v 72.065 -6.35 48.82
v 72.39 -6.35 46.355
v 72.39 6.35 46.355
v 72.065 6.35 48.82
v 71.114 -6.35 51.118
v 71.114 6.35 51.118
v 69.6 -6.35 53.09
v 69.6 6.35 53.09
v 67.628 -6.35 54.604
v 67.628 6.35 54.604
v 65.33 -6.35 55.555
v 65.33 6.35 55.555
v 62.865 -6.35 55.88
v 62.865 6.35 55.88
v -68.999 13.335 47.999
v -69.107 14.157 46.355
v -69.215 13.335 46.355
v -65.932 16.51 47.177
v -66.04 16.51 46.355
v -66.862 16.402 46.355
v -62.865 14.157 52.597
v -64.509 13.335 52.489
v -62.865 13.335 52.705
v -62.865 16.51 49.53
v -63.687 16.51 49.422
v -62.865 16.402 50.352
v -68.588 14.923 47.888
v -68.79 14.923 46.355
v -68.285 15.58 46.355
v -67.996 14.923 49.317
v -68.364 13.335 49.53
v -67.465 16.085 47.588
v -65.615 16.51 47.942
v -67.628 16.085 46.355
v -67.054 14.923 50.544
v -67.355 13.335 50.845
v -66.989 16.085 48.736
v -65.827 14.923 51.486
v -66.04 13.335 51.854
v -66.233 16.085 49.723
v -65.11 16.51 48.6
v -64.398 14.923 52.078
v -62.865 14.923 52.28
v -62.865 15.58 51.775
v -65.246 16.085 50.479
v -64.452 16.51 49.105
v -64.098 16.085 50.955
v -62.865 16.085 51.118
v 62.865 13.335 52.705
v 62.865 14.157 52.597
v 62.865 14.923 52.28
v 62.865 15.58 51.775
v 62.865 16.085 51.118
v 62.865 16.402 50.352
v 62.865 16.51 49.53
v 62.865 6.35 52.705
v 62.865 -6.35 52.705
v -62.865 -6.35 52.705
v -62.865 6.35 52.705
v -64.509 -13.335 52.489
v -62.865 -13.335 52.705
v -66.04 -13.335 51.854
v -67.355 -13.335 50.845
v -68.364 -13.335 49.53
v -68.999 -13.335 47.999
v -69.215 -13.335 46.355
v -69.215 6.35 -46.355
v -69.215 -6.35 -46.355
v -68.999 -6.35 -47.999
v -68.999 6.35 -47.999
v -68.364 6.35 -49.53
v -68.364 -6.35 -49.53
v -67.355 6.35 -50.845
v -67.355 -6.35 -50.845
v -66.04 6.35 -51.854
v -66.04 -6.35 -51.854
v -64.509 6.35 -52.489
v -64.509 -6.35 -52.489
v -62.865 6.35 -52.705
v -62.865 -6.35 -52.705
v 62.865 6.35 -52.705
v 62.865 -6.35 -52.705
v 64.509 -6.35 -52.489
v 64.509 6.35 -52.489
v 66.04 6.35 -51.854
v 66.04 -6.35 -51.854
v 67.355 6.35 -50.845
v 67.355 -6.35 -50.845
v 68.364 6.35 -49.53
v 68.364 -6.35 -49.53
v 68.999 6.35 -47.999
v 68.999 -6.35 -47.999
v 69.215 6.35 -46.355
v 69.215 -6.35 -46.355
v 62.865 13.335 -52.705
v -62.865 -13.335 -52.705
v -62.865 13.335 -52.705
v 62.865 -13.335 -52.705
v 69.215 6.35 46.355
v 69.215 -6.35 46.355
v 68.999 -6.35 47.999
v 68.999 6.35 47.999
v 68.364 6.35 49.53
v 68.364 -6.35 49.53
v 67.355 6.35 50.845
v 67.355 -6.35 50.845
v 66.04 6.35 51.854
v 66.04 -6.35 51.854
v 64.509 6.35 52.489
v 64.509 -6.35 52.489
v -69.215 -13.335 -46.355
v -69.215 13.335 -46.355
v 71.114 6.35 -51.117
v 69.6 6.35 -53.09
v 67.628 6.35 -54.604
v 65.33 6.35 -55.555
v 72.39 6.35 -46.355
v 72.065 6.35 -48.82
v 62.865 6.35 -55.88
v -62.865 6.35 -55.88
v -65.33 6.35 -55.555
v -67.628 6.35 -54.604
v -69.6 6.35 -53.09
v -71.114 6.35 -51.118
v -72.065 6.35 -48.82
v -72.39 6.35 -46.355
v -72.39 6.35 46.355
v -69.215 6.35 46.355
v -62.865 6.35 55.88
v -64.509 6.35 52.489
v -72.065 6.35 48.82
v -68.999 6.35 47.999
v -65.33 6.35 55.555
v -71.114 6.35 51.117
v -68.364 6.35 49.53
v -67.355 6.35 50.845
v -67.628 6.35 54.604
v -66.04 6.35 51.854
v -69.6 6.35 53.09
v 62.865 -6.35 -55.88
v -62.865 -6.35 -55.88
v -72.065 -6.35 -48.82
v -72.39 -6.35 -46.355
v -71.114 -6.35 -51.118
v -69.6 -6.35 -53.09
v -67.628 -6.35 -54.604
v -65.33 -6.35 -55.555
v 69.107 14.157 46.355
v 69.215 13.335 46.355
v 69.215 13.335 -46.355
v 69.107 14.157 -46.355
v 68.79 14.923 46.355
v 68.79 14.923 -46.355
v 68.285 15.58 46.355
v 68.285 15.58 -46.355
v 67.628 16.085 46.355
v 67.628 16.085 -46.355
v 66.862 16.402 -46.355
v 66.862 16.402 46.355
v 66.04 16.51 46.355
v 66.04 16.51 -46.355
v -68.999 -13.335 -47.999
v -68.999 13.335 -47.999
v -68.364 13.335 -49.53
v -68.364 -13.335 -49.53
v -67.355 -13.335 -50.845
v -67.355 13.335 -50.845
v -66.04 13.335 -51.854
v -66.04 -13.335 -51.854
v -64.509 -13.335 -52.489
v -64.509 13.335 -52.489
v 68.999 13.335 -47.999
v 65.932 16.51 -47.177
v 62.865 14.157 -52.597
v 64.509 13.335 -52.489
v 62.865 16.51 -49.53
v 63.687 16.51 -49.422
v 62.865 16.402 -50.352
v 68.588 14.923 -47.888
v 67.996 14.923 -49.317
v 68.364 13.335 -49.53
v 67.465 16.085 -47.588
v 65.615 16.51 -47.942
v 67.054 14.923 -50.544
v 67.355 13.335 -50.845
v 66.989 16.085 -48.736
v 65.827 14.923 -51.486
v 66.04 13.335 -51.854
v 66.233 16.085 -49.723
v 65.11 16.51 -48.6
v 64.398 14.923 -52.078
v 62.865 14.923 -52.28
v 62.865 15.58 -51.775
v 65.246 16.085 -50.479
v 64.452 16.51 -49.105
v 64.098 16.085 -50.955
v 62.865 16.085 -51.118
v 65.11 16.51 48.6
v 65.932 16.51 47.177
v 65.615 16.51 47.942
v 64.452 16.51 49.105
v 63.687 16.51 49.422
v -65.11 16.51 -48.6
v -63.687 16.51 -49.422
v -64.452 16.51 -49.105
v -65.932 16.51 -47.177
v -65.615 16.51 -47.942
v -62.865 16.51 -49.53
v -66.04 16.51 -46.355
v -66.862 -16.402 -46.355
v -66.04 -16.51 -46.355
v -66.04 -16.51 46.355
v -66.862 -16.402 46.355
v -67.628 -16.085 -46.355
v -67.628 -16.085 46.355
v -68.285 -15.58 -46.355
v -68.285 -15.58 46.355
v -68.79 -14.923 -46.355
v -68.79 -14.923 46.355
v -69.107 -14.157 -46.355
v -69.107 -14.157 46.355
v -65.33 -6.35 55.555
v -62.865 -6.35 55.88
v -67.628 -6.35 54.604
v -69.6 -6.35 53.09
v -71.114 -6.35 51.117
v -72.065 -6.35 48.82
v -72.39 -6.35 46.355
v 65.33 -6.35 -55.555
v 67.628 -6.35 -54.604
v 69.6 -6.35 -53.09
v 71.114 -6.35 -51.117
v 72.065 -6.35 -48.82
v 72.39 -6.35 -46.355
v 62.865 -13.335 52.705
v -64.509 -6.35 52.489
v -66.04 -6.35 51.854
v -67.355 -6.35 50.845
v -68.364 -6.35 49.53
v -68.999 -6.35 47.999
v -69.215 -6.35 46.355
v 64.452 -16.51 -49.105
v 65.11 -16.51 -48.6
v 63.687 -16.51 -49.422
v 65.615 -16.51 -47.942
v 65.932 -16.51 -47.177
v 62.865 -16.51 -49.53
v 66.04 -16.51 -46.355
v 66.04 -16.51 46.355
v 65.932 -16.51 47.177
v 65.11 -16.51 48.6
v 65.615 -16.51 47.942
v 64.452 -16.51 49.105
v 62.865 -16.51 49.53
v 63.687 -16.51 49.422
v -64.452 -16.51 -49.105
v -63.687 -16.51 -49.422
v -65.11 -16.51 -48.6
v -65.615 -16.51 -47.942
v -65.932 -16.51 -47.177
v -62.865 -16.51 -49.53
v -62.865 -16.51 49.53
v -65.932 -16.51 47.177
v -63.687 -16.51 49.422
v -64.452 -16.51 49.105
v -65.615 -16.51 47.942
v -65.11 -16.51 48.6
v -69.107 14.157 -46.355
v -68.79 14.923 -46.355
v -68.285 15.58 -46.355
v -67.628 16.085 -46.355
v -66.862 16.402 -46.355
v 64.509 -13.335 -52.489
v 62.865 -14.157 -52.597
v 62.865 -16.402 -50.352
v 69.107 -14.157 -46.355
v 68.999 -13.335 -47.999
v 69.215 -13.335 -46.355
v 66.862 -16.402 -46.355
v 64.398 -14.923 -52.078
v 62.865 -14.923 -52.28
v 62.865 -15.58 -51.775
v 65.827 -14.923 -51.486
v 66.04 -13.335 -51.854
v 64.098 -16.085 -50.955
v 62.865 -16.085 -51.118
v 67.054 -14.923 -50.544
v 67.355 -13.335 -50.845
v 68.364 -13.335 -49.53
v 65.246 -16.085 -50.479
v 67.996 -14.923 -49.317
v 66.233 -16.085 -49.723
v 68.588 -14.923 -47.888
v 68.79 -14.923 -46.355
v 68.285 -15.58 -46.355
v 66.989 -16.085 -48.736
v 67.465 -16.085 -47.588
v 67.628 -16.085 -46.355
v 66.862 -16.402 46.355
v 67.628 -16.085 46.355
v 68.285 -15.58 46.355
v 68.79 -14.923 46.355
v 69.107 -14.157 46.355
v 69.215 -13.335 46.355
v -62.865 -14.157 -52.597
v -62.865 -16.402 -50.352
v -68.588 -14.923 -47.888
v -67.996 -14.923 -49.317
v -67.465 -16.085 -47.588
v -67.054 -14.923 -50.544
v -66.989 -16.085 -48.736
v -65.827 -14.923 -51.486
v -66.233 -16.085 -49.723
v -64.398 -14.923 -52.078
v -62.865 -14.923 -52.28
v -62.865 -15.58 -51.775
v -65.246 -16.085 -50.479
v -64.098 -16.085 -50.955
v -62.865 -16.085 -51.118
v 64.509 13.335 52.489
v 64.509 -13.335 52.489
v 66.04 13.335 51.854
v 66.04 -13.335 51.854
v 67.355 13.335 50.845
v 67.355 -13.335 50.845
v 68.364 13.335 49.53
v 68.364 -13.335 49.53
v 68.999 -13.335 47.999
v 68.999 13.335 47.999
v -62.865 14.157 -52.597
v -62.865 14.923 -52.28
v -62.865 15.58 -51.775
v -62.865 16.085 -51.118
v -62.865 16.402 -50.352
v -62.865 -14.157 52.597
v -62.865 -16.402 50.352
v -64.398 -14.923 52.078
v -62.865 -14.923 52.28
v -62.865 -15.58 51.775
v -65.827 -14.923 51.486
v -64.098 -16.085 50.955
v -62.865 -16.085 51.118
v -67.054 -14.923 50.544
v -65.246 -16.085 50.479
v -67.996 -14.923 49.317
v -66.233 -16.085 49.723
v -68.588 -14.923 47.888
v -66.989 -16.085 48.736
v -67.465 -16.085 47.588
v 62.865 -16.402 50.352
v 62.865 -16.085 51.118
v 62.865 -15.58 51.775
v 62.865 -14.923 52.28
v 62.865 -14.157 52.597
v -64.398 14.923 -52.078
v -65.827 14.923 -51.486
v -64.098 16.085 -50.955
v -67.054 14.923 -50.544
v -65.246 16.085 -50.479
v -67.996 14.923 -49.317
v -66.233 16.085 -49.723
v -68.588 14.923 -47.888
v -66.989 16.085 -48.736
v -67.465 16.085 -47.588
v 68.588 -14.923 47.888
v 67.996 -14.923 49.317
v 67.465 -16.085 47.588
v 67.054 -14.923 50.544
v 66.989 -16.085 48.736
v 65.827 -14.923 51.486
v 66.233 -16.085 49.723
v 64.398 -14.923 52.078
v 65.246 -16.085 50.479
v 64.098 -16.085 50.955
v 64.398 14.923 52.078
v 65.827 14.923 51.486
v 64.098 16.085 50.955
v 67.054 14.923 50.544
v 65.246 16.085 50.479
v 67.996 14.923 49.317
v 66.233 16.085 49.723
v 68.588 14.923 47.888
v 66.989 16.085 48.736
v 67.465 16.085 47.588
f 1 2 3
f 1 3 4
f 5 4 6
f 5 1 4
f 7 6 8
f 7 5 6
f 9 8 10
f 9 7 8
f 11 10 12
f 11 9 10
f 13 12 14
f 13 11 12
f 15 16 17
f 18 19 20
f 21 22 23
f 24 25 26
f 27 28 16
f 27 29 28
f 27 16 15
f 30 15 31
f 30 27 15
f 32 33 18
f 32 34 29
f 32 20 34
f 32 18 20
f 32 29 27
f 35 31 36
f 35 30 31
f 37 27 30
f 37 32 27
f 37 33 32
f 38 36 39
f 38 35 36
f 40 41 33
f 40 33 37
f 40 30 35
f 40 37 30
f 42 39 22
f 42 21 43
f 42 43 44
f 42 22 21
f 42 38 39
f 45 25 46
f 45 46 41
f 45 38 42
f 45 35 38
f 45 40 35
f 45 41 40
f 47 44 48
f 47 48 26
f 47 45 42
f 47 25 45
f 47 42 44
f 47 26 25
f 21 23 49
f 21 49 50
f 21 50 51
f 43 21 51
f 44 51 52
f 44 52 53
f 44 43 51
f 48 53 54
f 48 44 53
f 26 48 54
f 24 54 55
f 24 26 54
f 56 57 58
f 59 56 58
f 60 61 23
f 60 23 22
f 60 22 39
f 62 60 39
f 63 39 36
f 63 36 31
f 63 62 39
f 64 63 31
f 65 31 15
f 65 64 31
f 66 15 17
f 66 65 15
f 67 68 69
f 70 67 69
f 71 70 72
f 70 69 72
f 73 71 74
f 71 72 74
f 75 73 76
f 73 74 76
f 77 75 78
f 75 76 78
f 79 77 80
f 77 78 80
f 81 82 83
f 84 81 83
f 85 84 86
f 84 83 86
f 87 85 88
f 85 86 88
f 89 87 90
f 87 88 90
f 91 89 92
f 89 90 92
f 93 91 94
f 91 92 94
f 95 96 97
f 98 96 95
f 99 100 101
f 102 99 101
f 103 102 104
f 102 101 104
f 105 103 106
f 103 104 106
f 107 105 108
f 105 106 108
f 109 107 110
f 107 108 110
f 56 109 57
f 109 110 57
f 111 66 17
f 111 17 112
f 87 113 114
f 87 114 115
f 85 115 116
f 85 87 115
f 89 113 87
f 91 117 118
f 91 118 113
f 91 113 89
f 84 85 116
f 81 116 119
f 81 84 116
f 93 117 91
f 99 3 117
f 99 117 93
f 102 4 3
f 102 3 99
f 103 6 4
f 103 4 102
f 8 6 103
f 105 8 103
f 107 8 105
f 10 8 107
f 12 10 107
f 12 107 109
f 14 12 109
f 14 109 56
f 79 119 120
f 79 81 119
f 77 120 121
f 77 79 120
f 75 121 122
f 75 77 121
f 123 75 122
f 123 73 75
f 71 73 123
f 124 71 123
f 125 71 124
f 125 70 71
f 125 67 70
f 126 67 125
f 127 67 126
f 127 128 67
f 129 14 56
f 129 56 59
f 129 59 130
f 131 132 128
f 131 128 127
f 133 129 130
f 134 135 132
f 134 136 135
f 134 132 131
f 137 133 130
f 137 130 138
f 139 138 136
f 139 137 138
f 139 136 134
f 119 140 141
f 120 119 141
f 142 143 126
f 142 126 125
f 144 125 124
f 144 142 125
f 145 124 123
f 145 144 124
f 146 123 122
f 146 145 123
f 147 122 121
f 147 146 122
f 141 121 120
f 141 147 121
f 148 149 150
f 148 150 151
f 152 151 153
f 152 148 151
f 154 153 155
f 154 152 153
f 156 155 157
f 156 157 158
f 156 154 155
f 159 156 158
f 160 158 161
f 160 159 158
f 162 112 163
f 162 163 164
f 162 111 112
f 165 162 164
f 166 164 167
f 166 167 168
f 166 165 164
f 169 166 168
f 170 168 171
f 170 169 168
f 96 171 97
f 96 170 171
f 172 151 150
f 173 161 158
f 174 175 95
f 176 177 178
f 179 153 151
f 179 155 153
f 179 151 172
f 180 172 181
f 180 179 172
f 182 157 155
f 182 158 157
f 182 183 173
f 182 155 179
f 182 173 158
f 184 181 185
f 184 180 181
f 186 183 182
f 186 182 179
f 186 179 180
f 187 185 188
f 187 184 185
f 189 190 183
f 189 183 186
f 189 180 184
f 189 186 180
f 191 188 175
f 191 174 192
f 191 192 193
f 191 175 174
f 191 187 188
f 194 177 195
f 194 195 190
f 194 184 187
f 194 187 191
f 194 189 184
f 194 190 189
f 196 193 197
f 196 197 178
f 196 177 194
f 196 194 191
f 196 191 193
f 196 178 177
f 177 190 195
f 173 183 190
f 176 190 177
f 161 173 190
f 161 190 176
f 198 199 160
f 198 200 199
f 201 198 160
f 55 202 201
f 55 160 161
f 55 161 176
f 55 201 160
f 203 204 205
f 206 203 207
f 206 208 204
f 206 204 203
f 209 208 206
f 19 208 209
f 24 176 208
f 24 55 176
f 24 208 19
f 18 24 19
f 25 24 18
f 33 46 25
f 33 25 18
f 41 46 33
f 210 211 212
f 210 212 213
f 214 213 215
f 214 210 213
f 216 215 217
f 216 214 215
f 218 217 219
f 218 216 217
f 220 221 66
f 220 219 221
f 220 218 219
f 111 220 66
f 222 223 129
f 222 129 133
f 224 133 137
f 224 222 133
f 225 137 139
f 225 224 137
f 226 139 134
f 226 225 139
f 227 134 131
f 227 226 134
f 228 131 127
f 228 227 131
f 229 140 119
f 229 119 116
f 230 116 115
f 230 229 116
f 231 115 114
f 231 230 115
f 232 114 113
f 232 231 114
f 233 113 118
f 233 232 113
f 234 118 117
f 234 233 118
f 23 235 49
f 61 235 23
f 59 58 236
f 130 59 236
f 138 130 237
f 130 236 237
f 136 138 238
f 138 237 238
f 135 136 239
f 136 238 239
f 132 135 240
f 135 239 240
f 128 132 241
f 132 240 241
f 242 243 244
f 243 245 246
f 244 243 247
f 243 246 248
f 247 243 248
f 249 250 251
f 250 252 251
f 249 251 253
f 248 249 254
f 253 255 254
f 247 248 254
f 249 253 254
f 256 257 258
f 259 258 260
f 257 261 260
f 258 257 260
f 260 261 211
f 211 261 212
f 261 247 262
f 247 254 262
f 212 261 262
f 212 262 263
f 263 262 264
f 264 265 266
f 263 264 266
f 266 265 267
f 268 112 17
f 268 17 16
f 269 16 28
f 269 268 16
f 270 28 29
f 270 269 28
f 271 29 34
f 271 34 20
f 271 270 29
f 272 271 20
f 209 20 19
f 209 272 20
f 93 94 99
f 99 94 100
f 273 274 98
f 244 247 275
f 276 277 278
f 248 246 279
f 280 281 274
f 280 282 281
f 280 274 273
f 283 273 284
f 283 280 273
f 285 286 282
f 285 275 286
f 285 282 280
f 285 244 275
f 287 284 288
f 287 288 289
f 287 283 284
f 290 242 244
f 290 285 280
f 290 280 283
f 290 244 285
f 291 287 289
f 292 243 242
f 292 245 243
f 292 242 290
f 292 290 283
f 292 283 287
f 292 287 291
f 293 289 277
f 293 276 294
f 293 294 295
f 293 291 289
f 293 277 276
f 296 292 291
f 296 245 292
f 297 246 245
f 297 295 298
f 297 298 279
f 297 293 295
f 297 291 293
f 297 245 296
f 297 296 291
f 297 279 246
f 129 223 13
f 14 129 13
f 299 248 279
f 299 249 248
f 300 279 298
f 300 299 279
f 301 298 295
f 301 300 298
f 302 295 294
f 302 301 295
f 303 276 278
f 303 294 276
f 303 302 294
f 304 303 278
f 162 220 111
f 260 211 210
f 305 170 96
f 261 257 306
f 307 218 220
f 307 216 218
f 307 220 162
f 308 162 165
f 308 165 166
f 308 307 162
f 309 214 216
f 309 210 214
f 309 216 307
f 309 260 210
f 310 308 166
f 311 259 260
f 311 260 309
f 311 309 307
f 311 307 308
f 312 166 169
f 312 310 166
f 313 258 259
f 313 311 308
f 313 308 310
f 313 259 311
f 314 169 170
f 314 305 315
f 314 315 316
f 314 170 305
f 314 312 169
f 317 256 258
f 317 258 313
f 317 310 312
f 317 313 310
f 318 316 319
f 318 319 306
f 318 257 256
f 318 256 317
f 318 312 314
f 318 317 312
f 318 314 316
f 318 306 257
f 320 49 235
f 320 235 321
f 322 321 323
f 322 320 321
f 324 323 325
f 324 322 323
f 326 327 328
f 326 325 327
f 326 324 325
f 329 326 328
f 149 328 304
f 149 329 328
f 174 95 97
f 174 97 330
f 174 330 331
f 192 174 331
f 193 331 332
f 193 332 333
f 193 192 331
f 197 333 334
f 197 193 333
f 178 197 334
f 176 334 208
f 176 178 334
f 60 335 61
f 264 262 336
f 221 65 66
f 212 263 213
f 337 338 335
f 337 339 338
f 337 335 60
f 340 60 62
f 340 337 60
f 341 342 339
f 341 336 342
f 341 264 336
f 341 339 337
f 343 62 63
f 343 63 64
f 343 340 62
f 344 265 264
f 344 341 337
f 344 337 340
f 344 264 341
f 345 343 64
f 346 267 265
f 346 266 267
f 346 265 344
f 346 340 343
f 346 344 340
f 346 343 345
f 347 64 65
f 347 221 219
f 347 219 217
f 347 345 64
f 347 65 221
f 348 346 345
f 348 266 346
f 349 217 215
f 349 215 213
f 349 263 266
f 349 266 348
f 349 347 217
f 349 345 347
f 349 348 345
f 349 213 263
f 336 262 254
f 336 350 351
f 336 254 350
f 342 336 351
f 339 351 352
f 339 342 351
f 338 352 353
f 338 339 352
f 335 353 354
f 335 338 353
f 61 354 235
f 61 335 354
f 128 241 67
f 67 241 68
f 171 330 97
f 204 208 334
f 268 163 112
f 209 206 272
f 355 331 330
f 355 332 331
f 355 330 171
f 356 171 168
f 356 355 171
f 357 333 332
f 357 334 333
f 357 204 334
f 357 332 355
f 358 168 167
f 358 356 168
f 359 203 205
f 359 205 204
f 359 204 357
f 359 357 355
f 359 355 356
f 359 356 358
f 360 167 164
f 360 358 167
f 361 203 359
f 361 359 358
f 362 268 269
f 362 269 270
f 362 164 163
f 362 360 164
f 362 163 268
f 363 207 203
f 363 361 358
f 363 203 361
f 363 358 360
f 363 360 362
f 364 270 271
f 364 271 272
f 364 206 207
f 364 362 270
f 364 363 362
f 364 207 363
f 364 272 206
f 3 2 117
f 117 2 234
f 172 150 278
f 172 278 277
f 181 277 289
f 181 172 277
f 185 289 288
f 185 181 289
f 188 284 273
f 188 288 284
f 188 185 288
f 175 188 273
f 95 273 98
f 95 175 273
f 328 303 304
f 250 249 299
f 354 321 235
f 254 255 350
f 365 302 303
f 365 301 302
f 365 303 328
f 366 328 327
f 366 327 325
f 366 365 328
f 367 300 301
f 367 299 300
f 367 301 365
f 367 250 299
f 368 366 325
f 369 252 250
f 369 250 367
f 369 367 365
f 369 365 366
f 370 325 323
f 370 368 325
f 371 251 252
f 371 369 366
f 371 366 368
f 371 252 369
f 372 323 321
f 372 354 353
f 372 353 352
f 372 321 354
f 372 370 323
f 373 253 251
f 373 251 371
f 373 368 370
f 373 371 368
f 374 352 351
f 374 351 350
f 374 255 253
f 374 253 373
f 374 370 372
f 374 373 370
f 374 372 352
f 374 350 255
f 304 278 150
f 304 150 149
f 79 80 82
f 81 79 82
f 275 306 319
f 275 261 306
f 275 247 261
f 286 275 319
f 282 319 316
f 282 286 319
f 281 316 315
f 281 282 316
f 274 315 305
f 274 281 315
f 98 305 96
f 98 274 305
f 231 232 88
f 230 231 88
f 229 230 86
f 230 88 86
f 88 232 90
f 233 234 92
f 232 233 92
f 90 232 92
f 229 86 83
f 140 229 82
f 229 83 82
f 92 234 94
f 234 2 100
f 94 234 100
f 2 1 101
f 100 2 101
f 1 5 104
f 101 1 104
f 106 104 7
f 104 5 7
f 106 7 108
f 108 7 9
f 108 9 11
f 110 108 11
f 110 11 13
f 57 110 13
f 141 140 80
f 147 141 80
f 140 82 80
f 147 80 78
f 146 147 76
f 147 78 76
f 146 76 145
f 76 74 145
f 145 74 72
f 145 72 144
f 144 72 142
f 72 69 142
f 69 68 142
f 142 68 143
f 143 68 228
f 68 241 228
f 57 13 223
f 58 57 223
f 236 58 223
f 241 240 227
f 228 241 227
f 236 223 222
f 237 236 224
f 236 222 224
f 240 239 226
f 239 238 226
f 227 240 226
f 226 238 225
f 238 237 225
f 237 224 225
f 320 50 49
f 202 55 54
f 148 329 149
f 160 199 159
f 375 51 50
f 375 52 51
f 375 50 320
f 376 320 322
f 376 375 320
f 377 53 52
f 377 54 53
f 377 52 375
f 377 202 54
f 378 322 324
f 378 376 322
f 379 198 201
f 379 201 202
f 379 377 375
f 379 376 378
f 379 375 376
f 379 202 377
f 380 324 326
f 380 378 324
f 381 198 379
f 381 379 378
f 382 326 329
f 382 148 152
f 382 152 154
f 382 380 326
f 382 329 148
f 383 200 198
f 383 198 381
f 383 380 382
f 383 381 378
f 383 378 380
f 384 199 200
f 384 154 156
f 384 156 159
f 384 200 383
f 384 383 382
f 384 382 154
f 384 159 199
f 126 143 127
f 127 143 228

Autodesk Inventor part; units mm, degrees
ref_plane "YZ Plane" through (0, 0, 0) normal (1, 0, 0) x (0, 1, 0)
ref_plane "XZ Plane" through (0, 0, 0) normal (0, 1, 0) x (-1, 0, 0)
ref_plane "XY Plane" through (0, 0, 0) normal (0, 0, 1) x (1, 0, 0)
sketch "Sketch2" plane through (0, 0, 0) normal (0, 1, 0) x (-1, 0, 0)
  line L0 (-69.215, 52.705) -> (69.215, 52.705)
  line L1 (69.215, 52.705) -> (69.215, -52.705)
  line L2 (69.215, -52.705) -> (-69.215, -52.705)
  line L3 (-69.215, -52.705) -> (-69.215, 52.705)
  point P0 (0, 0)
  point P1 (-69.215, 0)
  point P2 (0, -52.705)
  dimension "d0" = 138.43
  dimension "d1" = 105.41
extrude "Extrusion1" add sketch "Sketch2" along normal mid plane 33.02
fillet "Fillet1" radius 6.35 4 edges at (69.215, 0, 52.705) (69.215, 0, -52.705) (-69.215, 0, -52.705) (-69.215, 0, 52.705)
fillet "Fillet2" radius 3.175 16 edges at (0, -16.51, 52.705) (0, 16.51, 52.705) (-67.3551, -16.51, 50.8451) (-69.215, -16.51, 0) (-67.3551, -16.51, -50.8451) (0, -16.51, -52.705) (67.3551, -16.51, -50.8451) (69.215, -16.51, 0) (67.3551, -16.51, 50.8451) (67.3551, 16.51, 50.8451) (69.215, 16.51, 0) (67.3551, 16.51, -50.8451) (0, 16.51, -52.705) (-67.3551, 16.51, -50.8451) (-69.215, 16.51, 0) (-67.3551, 16.51, 50.8451)
sketch "Sketch3" plane through (0, 0, 0) normal (0, 1, 0) x (-1, 0, 0)
  arc A0 (62.865, -52.705) -> (69.215, -46.355) centre (62.865, -46.355) ccw projected
  line L0 (62.865, -52.705) -> (-62.865, -52.705) projected
  arc A1 (-69.215, -46.355) -> (-62.865, -52.705) centre (-62.865, -46.355) ccw projected
  line L1 (-69.215, -46.355) -> (-69.215, 46.355) projected
  arc A2 (-62.865, 52.705) -> (-69.215, 46.355) centre (-62.865, 46.355) ccw projected
  line L2 (-62.865, 52.705) -> (62.865, 52.705) projected
  arc A3 (69.215, 46.355) -> (62.865, 52.705) centre (62.865, 46.355) ccw projected
  line L3 (69.215, 46.355) -> (69.215, -46.355) projected
  line L4 (62.865, 55.88) -> (-62.865, 55.88)
  arc A4 (-62.865, 55.88) -> (-72.39, 46.355) centre (-62.865, 46.355) ccw
  line L5 (-72.39, 46.355) -> (-72.39, -46.355)
  arc A5 (-72.39, -46.355) -> (-62.865, -55.88) centre (-62.865, -46.355) ccw
  line L6 (-62.865, -55.88) -> (62.865, -55.88)
  arc A6 (62.865, -55.88) -> (72.39, -46.355) centre (62.865, -46.355) ccw
  line L7 (72.39, -46.355) -> (72.39, 46.355)
  arc A7 (72.39, 46.355) -> (62.865, 55.88) centre (62.865, 46.355) ccw
  point P0 (0, 0)
  dimension "d6" = 3.175
extrude "Extrusion2" add sketch "Sketch3" along normal mid plane 12.7 separate body
properties part number "D-Link Wireless Bridge Radio"
